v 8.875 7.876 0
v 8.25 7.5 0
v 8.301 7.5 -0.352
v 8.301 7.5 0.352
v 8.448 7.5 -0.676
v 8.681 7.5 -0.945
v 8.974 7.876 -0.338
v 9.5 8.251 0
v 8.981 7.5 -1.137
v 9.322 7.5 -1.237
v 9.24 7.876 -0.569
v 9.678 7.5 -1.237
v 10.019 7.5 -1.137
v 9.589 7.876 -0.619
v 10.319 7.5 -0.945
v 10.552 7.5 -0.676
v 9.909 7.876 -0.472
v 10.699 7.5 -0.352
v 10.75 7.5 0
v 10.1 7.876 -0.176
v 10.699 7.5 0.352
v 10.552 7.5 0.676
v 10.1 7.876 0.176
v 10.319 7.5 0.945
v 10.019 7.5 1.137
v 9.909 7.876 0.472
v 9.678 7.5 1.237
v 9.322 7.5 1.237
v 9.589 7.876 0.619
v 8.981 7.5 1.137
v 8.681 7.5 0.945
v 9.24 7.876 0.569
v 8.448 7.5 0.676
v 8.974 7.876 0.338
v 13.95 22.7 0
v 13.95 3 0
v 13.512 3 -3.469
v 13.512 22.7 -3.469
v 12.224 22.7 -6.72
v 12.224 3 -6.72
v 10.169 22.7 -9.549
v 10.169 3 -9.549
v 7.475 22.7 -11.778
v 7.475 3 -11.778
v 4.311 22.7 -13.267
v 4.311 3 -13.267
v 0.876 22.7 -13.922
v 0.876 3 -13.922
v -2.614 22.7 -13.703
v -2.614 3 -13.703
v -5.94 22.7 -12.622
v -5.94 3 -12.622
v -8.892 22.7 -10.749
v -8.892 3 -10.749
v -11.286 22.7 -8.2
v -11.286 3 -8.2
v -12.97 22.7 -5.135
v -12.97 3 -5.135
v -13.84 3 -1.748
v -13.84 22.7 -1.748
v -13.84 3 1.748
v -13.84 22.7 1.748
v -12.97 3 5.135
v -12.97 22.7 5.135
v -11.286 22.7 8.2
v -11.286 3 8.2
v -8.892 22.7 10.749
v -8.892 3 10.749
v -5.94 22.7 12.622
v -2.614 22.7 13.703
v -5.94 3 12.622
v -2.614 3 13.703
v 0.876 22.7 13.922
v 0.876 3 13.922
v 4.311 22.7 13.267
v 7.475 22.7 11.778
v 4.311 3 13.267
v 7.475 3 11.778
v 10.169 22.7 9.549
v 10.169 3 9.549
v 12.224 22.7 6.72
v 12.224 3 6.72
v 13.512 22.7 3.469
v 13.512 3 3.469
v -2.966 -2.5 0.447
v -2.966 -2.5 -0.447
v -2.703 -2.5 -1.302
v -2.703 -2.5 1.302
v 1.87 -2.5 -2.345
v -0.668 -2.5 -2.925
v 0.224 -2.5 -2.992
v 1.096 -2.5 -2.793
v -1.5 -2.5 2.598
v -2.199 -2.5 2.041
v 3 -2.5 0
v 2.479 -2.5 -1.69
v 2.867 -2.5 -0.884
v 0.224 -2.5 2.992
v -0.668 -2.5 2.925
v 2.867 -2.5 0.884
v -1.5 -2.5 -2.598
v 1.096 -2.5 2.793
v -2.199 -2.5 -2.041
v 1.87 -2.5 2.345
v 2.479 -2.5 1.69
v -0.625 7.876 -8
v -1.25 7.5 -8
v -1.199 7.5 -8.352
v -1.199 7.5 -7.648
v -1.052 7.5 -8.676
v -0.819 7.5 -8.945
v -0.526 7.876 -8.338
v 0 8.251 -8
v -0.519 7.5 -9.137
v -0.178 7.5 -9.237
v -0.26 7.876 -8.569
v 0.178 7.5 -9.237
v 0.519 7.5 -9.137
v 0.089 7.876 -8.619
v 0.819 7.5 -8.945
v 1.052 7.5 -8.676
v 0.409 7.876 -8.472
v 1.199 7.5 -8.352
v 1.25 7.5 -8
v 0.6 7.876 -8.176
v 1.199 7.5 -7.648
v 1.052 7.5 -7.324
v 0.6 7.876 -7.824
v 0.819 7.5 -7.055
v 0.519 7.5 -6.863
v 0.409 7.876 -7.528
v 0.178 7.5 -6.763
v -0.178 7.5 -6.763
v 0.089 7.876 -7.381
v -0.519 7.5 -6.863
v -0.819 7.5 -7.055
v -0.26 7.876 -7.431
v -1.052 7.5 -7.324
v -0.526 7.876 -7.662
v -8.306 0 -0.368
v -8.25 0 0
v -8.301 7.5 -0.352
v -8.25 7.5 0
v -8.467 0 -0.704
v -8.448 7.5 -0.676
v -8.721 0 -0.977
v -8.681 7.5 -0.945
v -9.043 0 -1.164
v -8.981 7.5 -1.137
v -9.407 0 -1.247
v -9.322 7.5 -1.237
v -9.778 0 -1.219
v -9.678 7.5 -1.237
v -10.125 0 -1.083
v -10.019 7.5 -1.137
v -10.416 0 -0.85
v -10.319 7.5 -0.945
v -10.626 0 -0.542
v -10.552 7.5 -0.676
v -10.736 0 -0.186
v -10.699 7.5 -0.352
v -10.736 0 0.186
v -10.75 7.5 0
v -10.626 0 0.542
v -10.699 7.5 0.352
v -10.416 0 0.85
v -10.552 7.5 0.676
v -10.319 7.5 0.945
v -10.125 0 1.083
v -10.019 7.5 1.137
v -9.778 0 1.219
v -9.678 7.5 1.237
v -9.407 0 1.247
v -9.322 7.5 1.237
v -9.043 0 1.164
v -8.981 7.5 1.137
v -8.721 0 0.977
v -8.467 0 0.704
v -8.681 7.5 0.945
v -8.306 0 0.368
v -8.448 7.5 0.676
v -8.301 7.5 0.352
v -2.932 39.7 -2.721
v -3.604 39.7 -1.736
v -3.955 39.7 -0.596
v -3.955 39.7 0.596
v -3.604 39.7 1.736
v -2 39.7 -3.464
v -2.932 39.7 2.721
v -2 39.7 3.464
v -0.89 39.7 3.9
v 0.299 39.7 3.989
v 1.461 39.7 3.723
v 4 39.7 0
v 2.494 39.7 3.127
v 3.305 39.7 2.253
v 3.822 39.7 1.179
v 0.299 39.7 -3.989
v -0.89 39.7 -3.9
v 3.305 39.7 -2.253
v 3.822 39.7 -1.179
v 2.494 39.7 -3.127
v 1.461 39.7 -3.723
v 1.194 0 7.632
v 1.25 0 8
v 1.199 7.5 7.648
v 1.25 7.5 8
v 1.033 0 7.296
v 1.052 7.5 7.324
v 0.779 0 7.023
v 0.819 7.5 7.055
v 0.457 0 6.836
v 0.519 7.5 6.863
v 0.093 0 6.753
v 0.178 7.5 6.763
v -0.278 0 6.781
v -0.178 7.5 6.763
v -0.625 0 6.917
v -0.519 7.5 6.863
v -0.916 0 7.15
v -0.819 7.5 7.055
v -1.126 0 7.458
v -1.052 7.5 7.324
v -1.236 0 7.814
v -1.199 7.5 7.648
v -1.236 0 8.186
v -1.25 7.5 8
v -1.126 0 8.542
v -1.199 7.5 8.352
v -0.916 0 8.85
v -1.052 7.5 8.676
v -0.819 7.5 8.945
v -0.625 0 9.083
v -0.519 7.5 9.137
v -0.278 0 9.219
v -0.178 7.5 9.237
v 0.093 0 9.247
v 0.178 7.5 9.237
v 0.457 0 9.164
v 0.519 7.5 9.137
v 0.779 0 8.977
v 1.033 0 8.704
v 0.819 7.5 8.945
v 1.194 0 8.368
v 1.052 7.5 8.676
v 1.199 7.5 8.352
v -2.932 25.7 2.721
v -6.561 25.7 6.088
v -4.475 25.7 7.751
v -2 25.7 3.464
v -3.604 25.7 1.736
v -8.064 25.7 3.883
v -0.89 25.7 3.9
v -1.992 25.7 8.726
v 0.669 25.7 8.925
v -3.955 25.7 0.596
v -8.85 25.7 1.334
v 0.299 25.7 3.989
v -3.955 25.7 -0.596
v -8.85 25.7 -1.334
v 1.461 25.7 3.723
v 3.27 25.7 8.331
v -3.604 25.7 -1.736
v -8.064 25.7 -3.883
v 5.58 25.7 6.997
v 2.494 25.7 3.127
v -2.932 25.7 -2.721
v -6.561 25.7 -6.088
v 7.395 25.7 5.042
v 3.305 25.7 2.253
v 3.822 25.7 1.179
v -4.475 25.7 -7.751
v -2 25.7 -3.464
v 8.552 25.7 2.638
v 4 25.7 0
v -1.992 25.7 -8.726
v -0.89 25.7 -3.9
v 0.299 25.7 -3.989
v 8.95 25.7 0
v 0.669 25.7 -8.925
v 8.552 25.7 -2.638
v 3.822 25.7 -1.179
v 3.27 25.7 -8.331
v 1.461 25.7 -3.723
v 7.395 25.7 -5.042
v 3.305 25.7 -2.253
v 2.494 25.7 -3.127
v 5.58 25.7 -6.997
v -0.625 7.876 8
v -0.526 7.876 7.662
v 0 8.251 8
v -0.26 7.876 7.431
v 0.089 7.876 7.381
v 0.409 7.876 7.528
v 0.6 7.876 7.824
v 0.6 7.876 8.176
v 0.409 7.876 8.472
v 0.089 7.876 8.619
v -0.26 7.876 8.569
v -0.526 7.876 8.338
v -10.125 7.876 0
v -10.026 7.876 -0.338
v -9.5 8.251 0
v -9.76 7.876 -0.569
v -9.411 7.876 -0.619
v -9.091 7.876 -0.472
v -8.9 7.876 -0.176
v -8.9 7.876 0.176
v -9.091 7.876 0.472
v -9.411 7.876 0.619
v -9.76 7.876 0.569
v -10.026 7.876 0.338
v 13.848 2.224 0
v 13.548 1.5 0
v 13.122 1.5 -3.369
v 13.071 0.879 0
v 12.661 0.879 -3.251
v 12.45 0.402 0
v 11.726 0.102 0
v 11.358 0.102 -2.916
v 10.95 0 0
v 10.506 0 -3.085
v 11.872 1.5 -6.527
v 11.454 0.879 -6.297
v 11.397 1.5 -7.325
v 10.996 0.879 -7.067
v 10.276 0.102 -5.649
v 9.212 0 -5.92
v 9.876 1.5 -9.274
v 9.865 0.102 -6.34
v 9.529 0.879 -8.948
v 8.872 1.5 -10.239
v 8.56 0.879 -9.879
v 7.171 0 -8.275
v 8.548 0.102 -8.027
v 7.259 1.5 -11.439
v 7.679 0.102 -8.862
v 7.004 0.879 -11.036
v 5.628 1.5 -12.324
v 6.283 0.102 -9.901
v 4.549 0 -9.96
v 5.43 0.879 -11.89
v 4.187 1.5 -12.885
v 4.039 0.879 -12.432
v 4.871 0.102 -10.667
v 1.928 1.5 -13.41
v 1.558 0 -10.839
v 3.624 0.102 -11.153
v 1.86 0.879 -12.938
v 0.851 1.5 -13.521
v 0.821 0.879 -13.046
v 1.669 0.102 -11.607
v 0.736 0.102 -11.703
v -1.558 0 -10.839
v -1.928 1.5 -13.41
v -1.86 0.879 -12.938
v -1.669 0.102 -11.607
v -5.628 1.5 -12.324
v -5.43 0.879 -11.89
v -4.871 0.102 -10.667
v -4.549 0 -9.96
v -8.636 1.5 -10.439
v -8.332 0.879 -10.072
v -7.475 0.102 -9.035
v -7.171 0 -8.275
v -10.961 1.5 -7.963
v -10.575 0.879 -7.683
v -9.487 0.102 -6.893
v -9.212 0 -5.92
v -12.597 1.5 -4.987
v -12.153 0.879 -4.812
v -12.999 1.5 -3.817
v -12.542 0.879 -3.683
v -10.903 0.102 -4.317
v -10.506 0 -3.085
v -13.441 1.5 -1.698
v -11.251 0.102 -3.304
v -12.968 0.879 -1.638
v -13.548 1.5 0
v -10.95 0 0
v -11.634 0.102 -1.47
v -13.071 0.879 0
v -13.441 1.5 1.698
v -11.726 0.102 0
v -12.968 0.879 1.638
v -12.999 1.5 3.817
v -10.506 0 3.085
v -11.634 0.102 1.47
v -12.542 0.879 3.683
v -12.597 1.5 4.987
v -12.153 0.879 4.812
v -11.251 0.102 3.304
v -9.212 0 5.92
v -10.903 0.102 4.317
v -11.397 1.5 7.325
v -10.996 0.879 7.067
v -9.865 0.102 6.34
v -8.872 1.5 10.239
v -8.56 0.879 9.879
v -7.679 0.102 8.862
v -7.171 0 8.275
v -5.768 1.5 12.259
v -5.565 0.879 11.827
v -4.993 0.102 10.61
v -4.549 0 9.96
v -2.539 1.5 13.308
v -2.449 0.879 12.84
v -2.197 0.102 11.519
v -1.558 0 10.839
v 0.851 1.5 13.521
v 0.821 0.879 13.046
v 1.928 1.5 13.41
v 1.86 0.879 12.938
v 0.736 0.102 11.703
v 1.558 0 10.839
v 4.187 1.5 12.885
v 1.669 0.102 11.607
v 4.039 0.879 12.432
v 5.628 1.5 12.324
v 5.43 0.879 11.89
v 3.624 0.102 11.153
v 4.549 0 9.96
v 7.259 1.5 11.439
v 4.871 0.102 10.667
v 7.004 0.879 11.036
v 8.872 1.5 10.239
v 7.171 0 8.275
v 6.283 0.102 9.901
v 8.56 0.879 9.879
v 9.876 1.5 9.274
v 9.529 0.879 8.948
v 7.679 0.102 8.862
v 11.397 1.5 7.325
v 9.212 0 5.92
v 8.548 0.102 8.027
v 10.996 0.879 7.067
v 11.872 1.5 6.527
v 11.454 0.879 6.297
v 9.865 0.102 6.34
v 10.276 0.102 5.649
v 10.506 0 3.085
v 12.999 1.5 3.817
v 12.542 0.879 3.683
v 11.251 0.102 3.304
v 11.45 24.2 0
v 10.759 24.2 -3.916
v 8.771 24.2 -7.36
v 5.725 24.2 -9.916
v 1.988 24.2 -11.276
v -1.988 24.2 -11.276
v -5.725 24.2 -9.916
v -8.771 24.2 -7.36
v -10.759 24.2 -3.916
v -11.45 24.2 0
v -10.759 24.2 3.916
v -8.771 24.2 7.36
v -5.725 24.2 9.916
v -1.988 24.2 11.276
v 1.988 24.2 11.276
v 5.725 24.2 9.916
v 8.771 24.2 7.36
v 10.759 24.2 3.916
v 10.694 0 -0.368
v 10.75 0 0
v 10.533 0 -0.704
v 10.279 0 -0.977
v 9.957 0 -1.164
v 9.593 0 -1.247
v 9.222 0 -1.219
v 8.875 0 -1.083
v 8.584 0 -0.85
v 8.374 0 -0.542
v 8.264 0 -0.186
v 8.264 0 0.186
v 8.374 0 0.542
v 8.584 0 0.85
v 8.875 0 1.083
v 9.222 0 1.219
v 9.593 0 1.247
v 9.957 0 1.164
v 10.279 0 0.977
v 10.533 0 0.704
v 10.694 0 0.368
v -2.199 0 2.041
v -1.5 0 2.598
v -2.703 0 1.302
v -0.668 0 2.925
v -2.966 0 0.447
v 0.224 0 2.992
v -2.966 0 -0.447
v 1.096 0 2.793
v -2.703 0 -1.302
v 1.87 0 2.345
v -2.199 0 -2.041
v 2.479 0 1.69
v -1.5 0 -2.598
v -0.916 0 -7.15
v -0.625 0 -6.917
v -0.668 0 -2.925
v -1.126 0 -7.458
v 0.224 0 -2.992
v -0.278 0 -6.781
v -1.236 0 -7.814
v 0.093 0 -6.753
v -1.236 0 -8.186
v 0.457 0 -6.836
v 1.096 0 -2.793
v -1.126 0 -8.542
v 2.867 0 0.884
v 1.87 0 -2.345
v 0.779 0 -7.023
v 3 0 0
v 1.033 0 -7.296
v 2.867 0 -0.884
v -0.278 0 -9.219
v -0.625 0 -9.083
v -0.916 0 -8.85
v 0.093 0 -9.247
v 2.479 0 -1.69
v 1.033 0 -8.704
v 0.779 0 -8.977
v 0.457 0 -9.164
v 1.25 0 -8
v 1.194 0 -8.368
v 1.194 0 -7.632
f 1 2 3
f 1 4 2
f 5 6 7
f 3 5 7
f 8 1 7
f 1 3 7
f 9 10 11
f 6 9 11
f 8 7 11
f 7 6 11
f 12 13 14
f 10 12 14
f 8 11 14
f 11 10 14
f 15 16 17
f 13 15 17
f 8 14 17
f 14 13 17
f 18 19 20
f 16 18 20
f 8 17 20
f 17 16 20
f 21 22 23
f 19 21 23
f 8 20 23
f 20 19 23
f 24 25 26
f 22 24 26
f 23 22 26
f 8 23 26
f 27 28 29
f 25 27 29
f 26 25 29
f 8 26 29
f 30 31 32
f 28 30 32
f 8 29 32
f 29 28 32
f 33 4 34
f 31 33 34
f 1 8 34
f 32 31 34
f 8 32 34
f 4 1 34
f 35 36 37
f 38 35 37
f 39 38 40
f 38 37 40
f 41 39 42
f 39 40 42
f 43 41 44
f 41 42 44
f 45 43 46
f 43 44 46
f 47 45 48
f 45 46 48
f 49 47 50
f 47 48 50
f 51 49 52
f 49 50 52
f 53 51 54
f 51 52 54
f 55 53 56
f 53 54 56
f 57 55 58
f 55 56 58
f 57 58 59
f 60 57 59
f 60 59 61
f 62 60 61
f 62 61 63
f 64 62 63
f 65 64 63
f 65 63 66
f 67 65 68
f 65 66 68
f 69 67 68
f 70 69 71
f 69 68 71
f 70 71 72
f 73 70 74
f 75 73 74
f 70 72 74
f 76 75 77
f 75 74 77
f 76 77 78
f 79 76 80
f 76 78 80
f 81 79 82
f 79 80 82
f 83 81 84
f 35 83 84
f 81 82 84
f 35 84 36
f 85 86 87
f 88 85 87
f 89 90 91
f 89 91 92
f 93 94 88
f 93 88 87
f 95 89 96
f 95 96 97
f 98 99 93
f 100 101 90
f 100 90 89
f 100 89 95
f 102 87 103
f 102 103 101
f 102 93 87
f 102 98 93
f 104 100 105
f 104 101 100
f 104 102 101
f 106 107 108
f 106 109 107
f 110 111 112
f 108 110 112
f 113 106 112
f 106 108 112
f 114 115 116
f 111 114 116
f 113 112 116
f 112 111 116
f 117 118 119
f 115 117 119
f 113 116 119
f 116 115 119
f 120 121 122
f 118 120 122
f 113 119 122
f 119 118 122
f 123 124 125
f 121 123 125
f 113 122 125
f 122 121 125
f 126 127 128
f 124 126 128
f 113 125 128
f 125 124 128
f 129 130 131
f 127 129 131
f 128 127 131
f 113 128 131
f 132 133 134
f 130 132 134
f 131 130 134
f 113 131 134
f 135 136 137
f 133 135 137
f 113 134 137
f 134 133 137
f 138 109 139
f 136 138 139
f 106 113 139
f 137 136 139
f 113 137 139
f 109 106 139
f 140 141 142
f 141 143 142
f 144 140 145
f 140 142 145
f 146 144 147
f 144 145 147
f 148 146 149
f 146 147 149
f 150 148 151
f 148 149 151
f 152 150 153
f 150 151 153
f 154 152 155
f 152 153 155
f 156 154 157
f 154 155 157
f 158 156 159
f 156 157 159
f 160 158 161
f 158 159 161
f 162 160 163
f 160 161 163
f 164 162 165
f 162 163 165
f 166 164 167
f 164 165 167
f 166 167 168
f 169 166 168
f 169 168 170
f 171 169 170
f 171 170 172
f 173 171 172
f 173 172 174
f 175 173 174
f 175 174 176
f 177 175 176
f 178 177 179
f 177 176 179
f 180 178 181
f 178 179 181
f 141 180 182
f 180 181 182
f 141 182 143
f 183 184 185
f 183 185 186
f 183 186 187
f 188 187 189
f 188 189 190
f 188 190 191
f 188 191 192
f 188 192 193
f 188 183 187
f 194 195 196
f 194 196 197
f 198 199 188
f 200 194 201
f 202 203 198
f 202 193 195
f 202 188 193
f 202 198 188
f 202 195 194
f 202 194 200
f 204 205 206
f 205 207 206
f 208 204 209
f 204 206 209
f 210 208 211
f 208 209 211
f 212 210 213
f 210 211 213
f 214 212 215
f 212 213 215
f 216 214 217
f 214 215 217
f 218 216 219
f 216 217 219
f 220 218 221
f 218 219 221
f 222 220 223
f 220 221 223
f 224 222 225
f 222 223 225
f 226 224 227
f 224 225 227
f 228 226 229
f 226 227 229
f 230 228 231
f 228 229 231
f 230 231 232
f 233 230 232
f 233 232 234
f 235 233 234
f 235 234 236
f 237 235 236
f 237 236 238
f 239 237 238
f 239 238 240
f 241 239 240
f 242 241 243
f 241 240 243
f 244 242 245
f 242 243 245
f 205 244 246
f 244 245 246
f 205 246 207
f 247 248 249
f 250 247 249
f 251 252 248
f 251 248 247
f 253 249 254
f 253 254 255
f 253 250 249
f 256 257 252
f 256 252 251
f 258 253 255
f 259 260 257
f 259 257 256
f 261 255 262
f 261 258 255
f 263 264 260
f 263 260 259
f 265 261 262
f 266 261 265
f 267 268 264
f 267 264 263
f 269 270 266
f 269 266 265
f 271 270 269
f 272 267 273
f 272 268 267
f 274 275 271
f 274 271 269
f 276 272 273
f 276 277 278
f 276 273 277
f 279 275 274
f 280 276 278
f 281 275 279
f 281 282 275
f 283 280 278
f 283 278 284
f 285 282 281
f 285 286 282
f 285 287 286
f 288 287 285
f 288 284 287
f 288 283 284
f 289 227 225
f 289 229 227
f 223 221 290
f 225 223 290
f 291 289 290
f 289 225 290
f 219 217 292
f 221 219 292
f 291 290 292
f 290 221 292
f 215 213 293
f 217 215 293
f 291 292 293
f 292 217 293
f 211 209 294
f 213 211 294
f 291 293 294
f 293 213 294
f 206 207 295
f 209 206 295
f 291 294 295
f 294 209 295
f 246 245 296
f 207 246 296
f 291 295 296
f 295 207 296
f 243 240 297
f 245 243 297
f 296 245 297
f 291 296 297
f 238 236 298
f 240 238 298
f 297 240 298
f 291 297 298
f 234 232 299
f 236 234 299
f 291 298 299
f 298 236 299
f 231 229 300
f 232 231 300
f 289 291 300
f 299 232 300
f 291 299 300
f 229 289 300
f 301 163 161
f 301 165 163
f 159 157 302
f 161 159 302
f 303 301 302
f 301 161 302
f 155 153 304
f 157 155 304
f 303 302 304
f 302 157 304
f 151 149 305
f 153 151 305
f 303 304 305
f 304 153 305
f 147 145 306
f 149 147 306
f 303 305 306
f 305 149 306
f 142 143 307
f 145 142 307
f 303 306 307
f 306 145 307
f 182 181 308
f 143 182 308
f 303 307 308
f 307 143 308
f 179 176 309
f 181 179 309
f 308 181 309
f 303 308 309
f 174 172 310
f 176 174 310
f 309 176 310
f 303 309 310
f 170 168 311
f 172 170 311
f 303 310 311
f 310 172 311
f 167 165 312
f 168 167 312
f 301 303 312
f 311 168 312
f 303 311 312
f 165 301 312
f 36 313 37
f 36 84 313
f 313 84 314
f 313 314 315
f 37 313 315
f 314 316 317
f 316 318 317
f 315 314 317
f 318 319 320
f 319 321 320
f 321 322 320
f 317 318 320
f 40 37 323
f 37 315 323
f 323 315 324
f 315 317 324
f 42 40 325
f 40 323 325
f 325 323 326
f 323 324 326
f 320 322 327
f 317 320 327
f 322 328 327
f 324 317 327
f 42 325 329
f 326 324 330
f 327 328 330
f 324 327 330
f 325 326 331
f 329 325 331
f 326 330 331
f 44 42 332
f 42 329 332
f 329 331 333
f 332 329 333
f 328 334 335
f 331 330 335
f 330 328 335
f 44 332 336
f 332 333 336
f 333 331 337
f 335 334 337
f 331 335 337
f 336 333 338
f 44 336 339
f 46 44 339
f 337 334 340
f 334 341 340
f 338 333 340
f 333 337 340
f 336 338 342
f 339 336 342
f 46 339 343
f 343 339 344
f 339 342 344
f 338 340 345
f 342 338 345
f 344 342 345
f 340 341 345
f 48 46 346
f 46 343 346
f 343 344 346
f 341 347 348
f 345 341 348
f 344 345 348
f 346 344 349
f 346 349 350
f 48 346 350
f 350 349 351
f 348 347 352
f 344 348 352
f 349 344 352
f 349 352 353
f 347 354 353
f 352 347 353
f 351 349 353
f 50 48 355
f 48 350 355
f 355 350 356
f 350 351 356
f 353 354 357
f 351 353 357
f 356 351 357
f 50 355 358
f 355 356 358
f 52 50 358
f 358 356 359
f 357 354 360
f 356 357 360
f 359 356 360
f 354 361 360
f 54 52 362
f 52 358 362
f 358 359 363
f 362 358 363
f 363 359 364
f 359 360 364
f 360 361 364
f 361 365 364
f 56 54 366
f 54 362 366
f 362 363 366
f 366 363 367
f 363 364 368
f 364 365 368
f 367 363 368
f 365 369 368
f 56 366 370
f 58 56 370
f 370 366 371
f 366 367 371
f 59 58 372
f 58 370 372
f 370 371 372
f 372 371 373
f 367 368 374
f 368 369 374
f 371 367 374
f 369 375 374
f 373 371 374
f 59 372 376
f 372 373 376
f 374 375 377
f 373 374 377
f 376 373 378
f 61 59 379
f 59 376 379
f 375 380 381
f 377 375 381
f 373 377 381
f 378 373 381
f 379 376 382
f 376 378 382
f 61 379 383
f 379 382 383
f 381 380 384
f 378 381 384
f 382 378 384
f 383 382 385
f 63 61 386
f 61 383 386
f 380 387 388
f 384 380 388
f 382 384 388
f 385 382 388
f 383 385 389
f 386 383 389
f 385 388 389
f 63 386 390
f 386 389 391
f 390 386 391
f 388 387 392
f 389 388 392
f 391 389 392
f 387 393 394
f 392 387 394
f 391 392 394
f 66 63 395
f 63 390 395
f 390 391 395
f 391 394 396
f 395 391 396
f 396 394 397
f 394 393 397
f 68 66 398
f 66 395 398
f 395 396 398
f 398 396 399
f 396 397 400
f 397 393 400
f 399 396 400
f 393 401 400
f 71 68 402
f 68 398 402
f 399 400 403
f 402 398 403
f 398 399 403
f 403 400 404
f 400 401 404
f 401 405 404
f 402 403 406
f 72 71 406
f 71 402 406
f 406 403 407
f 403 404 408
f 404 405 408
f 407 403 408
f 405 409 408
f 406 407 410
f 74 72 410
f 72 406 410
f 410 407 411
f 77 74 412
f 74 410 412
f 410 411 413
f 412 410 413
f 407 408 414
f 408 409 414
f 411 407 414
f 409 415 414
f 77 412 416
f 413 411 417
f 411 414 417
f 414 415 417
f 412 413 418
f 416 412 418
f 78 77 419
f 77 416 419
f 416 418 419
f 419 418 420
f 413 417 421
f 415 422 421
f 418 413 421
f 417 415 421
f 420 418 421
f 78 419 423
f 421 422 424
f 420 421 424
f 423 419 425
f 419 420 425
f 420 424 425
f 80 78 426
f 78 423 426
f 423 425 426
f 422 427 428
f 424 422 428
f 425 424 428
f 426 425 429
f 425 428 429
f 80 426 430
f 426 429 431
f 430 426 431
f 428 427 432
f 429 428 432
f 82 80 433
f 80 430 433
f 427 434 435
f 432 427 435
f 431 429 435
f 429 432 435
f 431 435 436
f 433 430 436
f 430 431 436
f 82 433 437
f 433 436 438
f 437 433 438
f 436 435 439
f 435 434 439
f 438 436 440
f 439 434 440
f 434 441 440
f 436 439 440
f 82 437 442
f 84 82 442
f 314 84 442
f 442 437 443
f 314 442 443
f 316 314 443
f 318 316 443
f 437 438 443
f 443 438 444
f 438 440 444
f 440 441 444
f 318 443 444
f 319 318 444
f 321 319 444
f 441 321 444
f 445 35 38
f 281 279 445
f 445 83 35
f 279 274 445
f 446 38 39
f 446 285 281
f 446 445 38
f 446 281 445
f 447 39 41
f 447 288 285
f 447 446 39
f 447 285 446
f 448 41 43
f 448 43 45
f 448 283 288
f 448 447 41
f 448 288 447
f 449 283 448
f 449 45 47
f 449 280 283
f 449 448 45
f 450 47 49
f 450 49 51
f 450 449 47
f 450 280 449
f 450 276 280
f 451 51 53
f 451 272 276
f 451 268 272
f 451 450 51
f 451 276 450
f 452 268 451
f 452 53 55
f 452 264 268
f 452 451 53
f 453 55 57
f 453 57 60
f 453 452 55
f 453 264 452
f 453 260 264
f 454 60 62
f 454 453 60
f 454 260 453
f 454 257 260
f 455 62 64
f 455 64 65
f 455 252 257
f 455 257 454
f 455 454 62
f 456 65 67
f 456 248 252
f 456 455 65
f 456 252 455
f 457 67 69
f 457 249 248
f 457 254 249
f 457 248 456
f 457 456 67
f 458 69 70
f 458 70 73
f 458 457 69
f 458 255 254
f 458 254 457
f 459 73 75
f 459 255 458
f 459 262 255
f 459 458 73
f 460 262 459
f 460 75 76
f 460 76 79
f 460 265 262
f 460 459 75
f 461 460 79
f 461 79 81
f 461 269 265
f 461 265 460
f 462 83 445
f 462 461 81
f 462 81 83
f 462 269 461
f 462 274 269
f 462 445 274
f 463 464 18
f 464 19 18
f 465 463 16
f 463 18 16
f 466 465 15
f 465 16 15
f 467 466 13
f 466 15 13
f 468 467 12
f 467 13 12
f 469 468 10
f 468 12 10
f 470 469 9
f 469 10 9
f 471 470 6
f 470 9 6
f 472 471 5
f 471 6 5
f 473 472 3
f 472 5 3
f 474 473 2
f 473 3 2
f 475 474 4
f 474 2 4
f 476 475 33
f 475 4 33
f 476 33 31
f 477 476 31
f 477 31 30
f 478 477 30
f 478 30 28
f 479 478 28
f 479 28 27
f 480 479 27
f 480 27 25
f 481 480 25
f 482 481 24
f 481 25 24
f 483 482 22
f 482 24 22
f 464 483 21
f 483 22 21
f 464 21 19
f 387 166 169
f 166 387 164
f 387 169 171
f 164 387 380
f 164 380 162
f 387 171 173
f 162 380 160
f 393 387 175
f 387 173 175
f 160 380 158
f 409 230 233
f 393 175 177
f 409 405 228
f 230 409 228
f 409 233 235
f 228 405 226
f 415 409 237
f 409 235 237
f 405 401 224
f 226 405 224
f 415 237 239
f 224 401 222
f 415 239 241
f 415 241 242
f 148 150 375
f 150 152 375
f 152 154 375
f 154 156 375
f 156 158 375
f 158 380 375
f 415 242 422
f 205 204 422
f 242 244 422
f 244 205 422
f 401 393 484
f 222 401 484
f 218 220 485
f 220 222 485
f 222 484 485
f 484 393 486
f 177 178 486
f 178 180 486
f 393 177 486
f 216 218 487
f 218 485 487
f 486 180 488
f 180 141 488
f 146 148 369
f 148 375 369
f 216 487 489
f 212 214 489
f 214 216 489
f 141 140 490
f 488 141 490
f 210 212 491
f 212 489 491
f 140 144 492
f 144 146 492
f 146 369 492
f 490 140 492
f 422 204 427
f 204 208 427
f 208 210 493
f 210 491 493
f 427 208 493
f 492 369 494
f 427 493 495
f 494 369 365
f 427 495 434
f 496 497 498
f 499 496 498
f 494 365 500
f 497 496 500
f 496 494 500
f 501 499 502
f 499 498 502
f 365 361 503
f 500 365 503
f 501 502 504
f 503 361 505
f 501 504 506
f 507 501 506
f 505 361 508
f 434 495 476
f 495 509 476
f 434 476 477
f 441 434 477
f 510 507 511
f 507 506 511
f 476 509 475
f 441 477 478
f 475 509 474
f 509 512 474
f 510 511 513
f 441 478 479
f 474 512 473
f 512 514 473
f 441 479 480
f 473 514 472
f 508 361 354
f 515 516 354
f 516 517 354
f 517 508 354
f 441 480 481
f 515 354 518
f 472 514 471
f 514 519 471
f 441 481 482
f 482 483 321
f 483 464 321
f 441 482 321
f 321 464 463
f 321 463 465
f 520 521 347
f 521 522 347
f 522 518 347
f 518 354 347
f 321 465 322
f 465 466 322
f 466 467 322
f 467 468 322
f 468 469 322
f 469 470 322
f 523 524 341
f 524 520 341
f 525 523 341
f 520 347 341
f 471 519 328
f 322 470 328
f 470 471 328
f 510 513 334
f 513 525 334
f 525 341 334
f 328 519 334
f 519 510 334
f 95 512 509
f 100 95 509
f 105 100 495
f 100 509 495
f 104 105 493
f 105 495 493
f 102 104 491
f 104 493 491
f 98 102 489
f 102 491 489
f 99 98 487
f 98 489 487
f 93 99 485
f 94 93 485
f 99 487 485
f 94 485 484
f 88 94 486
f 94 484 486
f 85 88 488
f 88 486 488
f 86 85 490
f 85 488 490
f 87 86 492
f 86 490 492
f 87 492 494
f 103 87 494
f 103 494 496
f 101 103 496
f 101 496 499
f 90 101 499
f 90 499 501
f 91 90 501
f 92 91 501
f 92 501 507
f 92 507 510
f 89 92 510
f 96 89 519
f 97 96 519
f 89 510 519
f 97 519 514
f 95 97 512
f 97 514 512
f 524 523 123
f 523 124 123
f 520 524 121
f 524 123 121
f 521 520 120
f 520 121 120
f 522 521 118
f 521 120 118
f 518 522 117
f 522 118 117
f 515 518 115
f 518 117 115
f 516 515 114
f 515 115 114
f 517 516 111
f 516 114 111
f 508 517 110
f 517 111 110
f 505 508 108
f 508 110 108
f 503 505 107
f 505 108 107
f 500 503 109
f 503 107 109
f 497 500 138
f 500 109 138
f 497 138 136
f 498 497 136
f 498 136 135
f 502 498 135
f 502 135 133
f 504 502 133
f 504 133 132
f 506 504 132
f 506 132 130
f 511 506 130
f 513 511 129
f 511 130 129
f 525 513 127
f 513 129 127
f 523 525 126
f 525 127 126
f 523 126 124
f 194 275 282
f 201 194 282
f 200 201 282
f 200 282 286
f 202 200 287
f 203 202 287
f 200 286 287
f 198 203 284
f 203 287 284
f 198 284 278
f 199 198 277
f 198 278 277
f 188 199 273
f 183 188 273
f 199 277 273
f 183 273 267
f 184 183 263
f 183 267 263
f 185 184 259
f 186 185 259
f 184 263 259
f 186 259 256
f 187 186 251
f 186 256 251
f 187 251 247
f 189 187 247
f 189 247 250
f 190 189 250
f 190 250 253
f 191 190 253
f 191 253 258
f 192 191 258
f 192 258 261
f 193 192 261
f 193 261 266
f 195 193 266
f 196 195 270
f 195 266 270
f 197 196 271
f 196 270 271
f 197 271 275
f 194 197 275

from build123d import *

# Parameters (mm, degrees)
SKETCH1_R                 = 13.95
BOSS_EXTRUDE1_DEPTH       = 25.7
CHAMFER1_SIZE             = 3
CHAMFER1_SIZE2            = 5
SKETCH2_R                 = 4
BOSS_EXTRUDE2_DEPTH       = 14
M3X0_5_TAPPED_HOLE1_D     = 2.5
M3X0_5_TAPPED_HOLE1_DEPTH = 7.5
M3X0_5_TAPPED_HOLE1_TIP   = 0.751075774
FILLET1_R                 = 3
SKETCH5_R                 = 3
BOSS_EXTRUDE3_DEPTH       = 2.5


with BuildPart() as part:
    # Sketch1 → Boss-Extrude1 (new body)
    with BuildSketch(Plane(origin=(0, 0, 0), x_dir=(1, 0, 0), z_dir=(0, 1, 0))):
        Circle(SKETCH1_R)
    extrude(amount=BOSS_EXTRUDE1_DEPTH)

    # Chamfer1
    chamfer1_edges = [part.edges().sort_by_distance(p)[0] for p in [
        (-13.95, 25.7, 0),
    ]]
    chamfer1_side = [part.faces().sort_by_distance(p)[0] for p in [
        (-13.95, 12.85, 0),
    ]]
    chamfer(chamfer1_edges, length=CHAMFER1_SIZE, length2=CHAMFER1_SIZE2, reference=chamfer1_side[0])

    # Sketch2 → Boss-Extrude2 (add)
    with BuildSketch(Plane(origin=(0, 25.7, 0), x_dir=(1, 0, 0), z_dir=(0, 1, 0))):
        Circle(SKETCH2_R)
    extrude(amount=BOSS_EXTRUDE2_DEPTH)

    # M3x0.5 Tapped Hole1
    with Locations(Plane(origin=(0, 0, 0), x_dir=(-1, 0, 0), z_dir=(0, -1, 0))):
        with Locations((0, 8), (0, -8), (-9.5, 0), (9.5, 0)):
            Hole(M3X0_5_TAPPED_HOLE1_D / 2, depth=M3X0_5_TAPPED_HOLE1_DEPTH)
            with Locations((0, 0, -(M3X0_5_TAPPED_HOLE1_DEPTH + M3X0_5_TAPPED_HOLE1_TIP / 2))):  # 118° drill point
                Cone(0, M3X0_5_TAPPED_HOLE1_D / 2, M3X0_5_TAPPED_HOLE1_TIP, mode=Mode.SUBTRACT)

    # Fillet1
    fillet1_edges = [part.edges().sort_by_distance(p)[0] for p in [
        (-13.95, 0, 0),
    ]]
    fillet(fillet1_edges, radius=FILLET1_R)

    # Sketch5 → Boss-Extrude3 (add)
    with BuildSketch(Plane.XZ):
        Circle(SKETCH5_R)
    extrude(amount=BOSS_EXTRUDE3_DEPTH)


solid = part.part
